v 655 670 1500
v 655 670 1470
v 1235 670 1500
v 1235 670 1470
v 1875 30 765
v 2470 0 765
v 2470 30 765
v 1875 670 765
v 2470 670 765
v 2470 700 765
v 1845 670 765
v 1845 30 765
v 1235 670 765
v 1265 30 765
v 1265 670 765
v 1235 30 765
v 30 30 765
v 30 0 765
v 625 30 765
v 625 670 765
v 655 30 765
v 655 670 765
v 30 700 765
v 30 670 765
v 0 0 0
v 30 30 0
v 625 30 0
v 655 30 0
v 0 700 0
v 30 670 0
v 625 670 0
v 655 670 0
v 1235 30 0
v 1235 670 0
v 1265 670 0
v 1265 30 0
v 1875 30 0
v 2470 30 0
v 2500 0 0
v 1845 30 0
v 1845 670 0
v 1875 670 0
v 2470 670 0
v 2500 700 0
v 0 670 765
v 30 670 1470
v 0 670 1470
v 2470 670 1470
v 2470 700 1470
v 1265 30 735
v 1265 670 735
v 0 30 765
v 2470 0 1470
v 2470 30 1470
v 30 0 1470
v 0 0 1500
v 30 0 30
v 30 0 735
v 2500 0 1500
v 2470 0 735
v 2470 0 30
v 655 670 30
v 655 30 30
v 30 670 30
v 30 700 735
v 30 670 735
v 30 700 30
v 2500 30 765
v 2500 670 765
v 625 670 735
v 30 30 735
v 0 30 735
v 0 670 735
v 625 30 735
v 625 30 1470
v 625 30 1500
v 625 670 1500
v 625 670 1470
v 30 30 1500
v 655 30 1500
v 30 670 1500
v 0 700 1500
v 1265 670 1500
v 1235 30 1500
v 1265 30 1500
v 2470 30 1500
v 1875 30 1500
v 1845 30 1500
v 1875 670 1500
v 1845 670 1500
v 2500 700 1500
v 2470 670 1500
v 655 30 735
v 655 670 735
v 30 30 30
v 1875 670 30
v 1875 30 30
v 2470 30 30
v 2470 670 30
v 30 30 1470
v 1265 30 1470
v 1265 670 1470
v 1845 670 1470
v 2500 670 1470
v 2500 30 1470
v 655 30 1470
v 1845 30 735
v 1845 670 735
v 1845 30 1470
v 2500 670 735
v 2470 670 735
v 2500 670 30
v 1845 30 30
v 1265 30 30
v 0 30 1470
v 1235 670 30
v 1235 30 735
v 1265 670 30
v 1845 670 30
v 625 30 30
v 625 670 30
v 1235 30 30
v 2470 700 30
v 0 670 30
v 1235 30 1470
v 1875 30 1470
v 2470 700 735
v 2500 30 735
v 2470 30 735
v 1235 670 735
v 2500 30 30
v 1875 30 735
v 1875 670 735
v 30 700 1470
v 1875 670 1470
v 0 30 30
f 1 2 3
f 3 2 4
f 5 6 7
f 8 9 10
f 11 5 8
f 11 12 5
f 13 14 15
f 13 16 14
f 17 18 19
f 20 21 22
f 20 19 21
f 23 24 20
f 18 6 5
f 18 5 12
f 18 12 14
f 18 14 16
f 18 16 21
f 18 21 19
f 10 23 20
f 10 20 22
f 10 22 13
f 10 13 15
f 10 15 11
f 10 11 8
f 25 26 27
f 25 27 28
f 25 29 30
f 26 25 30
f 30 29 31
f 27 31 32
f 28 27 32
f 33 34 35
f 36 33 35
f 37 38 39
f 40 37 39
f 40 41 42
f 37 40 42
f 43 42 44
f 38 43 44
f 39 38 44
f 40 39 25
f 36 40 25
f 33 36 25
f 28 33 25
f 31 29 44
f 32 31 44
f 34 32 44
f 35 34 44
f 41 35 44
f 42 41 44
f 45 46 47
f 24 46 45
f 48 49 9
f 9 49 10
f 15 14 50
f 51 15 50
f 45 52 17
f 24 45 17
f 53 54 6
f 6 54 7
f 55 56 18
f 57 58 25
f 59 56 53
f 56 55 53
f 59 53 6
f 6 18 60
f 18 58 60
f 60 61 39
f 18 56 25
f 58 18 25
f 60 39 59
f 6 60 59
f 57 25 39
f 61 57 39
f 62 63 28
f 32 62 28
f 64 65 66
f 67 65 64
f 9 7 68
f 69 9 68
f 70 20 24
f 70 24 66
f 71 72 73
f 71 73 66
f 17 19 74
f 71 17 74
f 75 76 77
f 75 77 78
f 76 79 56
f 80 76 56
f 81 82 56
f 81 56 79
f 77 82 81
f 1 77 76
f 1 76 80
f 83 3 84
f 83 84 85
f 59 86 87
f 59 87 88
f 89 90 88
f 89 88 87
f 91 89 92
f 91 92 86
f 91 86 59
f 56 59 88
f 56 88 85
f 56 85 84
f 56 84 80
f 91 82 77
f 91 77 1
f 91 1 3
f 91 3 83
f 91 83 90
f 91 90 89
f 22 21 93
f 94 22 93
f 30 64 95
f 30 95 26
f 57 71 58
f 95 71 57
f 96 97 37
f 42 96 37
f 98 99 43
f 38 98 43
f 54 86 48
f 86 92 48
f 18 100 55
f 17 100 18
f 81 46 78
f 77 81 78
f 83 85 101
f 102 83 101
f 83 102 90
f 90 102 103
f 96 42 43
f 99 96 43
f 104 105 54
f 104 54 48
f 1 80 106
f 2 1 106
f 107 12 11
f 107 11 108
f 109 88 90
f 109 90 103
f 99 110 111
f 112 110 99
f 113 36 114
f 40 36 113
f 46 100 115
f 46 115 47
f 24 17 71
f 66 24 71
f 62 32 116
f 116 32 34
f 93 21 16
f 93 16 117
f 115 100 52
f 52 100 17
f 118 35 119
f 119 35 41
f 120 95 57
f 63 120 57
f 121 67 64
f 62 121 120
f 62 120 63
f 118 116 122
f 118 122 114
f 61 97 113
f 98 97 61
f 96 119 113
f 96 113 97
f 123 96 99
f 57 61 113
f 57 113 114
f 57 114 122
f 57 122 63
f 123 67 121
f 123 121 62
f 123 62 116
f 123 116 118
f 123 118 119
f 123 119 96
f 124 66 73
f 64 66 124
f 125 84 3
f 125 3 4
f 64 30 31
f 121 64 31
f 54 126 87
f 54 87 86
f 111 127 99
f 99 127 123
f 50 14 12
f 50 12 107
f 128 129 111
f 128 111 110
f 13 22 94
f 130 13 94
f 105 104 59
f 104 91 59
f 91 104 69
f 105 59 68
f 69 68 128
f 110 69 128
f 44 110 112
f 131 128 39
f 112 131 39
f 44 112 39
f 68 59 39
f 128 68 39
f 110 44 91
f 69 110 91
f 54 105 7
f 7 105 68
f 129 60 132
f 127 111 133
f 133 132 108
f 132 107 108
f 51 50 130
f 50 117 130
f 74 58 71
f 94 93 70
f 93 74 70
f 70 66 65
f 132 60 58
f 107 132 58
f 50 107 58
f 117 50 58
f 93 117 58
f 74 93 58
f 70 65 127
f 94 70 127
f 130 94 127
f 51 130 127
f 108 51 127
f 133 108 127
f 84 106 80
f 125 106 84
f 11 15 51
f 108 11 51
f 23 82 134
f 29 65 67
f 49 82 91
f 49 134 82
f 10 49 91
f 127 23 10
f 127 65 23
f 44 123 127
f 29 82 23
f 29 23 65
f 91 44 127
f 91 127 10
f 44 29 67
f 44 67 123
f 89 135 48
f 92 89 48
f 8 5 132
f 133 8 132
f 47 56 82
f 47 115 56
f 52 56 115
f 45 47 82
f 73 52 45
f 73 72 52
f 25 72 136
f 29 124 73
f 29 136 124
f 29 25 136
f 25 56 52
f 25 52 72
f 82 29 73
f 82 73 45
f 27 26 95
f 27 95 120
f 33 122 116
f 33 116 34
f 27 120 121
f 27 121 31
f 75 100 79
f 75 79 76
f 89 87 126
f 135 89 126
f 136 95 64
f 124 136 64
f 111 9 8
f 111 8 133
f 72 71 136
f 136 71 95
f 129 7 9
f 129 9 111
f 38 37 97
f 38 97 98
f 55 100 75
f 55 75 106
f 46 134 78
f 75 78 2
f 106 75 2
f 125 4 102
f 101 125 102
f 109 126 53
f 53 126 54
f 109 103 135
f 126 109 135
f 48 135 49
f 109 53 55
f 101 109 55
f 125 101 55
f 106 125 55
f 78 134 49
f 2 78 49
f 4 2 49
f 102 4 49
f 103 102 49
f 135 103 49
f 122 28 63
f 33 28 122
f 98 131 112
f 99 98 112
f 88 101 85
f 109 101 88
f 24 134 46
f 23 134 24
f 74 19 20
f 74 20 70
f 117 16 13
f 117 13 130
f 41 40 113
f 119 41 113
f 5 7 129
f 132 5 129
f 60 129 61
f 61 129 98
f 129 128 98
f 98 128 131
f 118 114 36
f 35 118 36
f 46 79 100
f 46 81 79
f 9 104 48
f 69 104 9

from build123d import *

# Parameters (mm, degrees)
SKETCH1_W           = 2500
SKETCH1_H           = 700
SKETCH1_W_2         = 2440
SKETCH1_H_2         = 640
BOSS_EXTRUDE1_DEPTH = 1500
SKETCH2_W           = 2440
SKETCH2_H           = 1440
CUT_EXTRUDE1_DEPTH  = 1500
SKETCH3_W           = 1440
SKETCH3_H           = 640
CUT_EXTRUDE2_DEPTH  = 3595
SKETCH5_W           = 15
SKETCH5_H           = 30
BOSS_EXTRUDE3_DEPTH = 640
BOSS_EXTRUDE4_REACH = 2472
SKETCH7_W           = 30
SKETCH7_H           = 30
SKETCH8_W           = 30
SKETCH8_H           = 30
BOSS_EXTRUDE5_DEPTH = 640


with BuildPart() as part:
    # Sketch1 → Boss-Extrude1 (new body)
    with BuildSketch(Plane.XY):
        with Locations((1250, 350)):
            Rectangle(SKETCH1_W, SKETCH1_H)
        with Locations((1250, 350)):
            Rectangle(SKETCH1_W_2, SKETCH1_H_2, mode=Mode.SUBTRACT)
    extrude(amount=BOSS_EXTRUDE1_DEPTH)

    # Sketch2 → Cut-Extrude1 (cut)
    with BuildSketch(Plane(origin=(0, 700, 0), x_dir=(1, 0, 0), z_dir=(0, 1, 0))):
        with Locations((1250, -750)):
            Rectangle(SKETCH2_W, SKETCH2_H)
    extrude(amount=-CUT_EXTRUDE1_DEPTH, mode=Mode.SUBTRACT)

    # Sketch3 → Cut-Extrude2 (cut)
    with BuildSketch(Plane(origin=(2500, 0, 0), x_dir=(0, 0, -1), z_dir=(1, 0, 0))):
        with Locations((-750, 350)):
            Rectangle(SKETCH3_W, SKETCH3_H)
    extrude(amount=-CUT_EXTRUDE2_DEPTH, mode=Mode.SUBTRACT)

    # Sketch5 → Boss-Extrude3 (add)
    with BuildSketch(Plane(origin=(0, 30, 0), x_dir=(1, 0, 0), z_dir=(0, 1, 0))):
        with Locations((632.5, -15)):
            Rectangle(SKETCH5_W, SKETCH5_H)
        with Locations((647.5, -15)):
            Rectangle(SKETCH5_W, SKETCH5_H)
        with Locations((1242.5, -15)):
            Rectangle(SKETCH5_W, SKETCH5_H)
        with Locations((1257.5, -15)):
            Rectangle(SKETCH5_W, SKETCH5_H)
        Polygon((1860, 0), (1845, 0), (1845, -30), (1860, -30), (1875, -30), (1875, 0), align=None)
        with Locations((1852.5, -1485)):
            Rectangle(SKETCH5_W, SKETCH5_H)
        with Locations((1867.5, -1485)):
            Rectangle(SKETCH5_W, SKETCH5_H)
        with Locations((1242.5, -1485)):
            Rectangle(SKETCH5_W, SKETCH5_H)
        with Locations((1257.5, -1485)):
            Rectangle(SKETCH5_W, SKETCH5_H)
        with Locations((647.5, -1485)):
            Rectangle(SKETCH5_W, SKETCH5_H)
        with Locations((632.5, -1485)):
            Rectangle(SKETCH5_W, SKETCH5_H)
    extrude(amount=BOSS_EXTRUDE3_DEPTH)

    # Sketch7 → Boss-Extrude4 (add, up to next)
    with BuildSketch(Plane(origin=(30, 0, 0), x_dir=(0, 0, -1), z_dir=(1, 0, 0)), mode=Mode.PRIVATE) as boss_extrude4_sk1:
        with Locations((-750, 15)):
            Rectangle(SKETCH7_W, SKETCH7_H)
    boss_extrude4_tool1 = extrude(boss_extrude4_sk1.sketch, amount=BOSS_EXTRUDE4_REACH, mode=Mode.PRIVATE) - part.part
    add(boss_extrude4_tool1.solids().sort_by_distance((30, 15, 750))[0])
    # Sketch7 → Boss-Extrude4 (add, up to next)
    with BuildSketch(Plane(origin=(30, 0, 0), x_dir=(0, 0, -1), z_dir=(1, 0, 0)), mode=Mode.PRIVATE) as boss_extrude4_sk2:
        with Locations((-750, 685)):
            Rectangle(SKETCH7_W, SKETCH7_H)
    boss_extrude4_tool2 = extrude(boss_extrude4_sk2.sketch, amount=BOSS_EXTRUDE4_REACH, mode=Mode.PRIVATE) - part.part
    add(boss_extrude4_tool2.solids().sort_by_distance((30, 685, 750))[0])

    # Sketch8 → Boss-Extrude5 (add)
    with BuildSketch(Plane(origin=(0, 30, 0), x_dir=(1, 0, 0), z_dir=(0, 1, 0))):
        with Locations((2485, -750)):
            Rectangle(SKETCH8_W, SKETCH8_H)
        with Locations((15, -750)):
            Rectangle(SKETCH8_W, SKETCH8_H)
        with Locations((640, -750)):
            Rectangle(SKETCH8_W, SKETCH8_H)
        with Locations((1250, -750)):
            Rectangle(SKETCH8_W, SKETCH8_H)
        with Locations((1860, -750)):
            Rectangle(SKETCH8_W, SKETCH8_H)
    extrude(amount=BOSS_EXTRUDE5_DEPTH)


solid = part.part
